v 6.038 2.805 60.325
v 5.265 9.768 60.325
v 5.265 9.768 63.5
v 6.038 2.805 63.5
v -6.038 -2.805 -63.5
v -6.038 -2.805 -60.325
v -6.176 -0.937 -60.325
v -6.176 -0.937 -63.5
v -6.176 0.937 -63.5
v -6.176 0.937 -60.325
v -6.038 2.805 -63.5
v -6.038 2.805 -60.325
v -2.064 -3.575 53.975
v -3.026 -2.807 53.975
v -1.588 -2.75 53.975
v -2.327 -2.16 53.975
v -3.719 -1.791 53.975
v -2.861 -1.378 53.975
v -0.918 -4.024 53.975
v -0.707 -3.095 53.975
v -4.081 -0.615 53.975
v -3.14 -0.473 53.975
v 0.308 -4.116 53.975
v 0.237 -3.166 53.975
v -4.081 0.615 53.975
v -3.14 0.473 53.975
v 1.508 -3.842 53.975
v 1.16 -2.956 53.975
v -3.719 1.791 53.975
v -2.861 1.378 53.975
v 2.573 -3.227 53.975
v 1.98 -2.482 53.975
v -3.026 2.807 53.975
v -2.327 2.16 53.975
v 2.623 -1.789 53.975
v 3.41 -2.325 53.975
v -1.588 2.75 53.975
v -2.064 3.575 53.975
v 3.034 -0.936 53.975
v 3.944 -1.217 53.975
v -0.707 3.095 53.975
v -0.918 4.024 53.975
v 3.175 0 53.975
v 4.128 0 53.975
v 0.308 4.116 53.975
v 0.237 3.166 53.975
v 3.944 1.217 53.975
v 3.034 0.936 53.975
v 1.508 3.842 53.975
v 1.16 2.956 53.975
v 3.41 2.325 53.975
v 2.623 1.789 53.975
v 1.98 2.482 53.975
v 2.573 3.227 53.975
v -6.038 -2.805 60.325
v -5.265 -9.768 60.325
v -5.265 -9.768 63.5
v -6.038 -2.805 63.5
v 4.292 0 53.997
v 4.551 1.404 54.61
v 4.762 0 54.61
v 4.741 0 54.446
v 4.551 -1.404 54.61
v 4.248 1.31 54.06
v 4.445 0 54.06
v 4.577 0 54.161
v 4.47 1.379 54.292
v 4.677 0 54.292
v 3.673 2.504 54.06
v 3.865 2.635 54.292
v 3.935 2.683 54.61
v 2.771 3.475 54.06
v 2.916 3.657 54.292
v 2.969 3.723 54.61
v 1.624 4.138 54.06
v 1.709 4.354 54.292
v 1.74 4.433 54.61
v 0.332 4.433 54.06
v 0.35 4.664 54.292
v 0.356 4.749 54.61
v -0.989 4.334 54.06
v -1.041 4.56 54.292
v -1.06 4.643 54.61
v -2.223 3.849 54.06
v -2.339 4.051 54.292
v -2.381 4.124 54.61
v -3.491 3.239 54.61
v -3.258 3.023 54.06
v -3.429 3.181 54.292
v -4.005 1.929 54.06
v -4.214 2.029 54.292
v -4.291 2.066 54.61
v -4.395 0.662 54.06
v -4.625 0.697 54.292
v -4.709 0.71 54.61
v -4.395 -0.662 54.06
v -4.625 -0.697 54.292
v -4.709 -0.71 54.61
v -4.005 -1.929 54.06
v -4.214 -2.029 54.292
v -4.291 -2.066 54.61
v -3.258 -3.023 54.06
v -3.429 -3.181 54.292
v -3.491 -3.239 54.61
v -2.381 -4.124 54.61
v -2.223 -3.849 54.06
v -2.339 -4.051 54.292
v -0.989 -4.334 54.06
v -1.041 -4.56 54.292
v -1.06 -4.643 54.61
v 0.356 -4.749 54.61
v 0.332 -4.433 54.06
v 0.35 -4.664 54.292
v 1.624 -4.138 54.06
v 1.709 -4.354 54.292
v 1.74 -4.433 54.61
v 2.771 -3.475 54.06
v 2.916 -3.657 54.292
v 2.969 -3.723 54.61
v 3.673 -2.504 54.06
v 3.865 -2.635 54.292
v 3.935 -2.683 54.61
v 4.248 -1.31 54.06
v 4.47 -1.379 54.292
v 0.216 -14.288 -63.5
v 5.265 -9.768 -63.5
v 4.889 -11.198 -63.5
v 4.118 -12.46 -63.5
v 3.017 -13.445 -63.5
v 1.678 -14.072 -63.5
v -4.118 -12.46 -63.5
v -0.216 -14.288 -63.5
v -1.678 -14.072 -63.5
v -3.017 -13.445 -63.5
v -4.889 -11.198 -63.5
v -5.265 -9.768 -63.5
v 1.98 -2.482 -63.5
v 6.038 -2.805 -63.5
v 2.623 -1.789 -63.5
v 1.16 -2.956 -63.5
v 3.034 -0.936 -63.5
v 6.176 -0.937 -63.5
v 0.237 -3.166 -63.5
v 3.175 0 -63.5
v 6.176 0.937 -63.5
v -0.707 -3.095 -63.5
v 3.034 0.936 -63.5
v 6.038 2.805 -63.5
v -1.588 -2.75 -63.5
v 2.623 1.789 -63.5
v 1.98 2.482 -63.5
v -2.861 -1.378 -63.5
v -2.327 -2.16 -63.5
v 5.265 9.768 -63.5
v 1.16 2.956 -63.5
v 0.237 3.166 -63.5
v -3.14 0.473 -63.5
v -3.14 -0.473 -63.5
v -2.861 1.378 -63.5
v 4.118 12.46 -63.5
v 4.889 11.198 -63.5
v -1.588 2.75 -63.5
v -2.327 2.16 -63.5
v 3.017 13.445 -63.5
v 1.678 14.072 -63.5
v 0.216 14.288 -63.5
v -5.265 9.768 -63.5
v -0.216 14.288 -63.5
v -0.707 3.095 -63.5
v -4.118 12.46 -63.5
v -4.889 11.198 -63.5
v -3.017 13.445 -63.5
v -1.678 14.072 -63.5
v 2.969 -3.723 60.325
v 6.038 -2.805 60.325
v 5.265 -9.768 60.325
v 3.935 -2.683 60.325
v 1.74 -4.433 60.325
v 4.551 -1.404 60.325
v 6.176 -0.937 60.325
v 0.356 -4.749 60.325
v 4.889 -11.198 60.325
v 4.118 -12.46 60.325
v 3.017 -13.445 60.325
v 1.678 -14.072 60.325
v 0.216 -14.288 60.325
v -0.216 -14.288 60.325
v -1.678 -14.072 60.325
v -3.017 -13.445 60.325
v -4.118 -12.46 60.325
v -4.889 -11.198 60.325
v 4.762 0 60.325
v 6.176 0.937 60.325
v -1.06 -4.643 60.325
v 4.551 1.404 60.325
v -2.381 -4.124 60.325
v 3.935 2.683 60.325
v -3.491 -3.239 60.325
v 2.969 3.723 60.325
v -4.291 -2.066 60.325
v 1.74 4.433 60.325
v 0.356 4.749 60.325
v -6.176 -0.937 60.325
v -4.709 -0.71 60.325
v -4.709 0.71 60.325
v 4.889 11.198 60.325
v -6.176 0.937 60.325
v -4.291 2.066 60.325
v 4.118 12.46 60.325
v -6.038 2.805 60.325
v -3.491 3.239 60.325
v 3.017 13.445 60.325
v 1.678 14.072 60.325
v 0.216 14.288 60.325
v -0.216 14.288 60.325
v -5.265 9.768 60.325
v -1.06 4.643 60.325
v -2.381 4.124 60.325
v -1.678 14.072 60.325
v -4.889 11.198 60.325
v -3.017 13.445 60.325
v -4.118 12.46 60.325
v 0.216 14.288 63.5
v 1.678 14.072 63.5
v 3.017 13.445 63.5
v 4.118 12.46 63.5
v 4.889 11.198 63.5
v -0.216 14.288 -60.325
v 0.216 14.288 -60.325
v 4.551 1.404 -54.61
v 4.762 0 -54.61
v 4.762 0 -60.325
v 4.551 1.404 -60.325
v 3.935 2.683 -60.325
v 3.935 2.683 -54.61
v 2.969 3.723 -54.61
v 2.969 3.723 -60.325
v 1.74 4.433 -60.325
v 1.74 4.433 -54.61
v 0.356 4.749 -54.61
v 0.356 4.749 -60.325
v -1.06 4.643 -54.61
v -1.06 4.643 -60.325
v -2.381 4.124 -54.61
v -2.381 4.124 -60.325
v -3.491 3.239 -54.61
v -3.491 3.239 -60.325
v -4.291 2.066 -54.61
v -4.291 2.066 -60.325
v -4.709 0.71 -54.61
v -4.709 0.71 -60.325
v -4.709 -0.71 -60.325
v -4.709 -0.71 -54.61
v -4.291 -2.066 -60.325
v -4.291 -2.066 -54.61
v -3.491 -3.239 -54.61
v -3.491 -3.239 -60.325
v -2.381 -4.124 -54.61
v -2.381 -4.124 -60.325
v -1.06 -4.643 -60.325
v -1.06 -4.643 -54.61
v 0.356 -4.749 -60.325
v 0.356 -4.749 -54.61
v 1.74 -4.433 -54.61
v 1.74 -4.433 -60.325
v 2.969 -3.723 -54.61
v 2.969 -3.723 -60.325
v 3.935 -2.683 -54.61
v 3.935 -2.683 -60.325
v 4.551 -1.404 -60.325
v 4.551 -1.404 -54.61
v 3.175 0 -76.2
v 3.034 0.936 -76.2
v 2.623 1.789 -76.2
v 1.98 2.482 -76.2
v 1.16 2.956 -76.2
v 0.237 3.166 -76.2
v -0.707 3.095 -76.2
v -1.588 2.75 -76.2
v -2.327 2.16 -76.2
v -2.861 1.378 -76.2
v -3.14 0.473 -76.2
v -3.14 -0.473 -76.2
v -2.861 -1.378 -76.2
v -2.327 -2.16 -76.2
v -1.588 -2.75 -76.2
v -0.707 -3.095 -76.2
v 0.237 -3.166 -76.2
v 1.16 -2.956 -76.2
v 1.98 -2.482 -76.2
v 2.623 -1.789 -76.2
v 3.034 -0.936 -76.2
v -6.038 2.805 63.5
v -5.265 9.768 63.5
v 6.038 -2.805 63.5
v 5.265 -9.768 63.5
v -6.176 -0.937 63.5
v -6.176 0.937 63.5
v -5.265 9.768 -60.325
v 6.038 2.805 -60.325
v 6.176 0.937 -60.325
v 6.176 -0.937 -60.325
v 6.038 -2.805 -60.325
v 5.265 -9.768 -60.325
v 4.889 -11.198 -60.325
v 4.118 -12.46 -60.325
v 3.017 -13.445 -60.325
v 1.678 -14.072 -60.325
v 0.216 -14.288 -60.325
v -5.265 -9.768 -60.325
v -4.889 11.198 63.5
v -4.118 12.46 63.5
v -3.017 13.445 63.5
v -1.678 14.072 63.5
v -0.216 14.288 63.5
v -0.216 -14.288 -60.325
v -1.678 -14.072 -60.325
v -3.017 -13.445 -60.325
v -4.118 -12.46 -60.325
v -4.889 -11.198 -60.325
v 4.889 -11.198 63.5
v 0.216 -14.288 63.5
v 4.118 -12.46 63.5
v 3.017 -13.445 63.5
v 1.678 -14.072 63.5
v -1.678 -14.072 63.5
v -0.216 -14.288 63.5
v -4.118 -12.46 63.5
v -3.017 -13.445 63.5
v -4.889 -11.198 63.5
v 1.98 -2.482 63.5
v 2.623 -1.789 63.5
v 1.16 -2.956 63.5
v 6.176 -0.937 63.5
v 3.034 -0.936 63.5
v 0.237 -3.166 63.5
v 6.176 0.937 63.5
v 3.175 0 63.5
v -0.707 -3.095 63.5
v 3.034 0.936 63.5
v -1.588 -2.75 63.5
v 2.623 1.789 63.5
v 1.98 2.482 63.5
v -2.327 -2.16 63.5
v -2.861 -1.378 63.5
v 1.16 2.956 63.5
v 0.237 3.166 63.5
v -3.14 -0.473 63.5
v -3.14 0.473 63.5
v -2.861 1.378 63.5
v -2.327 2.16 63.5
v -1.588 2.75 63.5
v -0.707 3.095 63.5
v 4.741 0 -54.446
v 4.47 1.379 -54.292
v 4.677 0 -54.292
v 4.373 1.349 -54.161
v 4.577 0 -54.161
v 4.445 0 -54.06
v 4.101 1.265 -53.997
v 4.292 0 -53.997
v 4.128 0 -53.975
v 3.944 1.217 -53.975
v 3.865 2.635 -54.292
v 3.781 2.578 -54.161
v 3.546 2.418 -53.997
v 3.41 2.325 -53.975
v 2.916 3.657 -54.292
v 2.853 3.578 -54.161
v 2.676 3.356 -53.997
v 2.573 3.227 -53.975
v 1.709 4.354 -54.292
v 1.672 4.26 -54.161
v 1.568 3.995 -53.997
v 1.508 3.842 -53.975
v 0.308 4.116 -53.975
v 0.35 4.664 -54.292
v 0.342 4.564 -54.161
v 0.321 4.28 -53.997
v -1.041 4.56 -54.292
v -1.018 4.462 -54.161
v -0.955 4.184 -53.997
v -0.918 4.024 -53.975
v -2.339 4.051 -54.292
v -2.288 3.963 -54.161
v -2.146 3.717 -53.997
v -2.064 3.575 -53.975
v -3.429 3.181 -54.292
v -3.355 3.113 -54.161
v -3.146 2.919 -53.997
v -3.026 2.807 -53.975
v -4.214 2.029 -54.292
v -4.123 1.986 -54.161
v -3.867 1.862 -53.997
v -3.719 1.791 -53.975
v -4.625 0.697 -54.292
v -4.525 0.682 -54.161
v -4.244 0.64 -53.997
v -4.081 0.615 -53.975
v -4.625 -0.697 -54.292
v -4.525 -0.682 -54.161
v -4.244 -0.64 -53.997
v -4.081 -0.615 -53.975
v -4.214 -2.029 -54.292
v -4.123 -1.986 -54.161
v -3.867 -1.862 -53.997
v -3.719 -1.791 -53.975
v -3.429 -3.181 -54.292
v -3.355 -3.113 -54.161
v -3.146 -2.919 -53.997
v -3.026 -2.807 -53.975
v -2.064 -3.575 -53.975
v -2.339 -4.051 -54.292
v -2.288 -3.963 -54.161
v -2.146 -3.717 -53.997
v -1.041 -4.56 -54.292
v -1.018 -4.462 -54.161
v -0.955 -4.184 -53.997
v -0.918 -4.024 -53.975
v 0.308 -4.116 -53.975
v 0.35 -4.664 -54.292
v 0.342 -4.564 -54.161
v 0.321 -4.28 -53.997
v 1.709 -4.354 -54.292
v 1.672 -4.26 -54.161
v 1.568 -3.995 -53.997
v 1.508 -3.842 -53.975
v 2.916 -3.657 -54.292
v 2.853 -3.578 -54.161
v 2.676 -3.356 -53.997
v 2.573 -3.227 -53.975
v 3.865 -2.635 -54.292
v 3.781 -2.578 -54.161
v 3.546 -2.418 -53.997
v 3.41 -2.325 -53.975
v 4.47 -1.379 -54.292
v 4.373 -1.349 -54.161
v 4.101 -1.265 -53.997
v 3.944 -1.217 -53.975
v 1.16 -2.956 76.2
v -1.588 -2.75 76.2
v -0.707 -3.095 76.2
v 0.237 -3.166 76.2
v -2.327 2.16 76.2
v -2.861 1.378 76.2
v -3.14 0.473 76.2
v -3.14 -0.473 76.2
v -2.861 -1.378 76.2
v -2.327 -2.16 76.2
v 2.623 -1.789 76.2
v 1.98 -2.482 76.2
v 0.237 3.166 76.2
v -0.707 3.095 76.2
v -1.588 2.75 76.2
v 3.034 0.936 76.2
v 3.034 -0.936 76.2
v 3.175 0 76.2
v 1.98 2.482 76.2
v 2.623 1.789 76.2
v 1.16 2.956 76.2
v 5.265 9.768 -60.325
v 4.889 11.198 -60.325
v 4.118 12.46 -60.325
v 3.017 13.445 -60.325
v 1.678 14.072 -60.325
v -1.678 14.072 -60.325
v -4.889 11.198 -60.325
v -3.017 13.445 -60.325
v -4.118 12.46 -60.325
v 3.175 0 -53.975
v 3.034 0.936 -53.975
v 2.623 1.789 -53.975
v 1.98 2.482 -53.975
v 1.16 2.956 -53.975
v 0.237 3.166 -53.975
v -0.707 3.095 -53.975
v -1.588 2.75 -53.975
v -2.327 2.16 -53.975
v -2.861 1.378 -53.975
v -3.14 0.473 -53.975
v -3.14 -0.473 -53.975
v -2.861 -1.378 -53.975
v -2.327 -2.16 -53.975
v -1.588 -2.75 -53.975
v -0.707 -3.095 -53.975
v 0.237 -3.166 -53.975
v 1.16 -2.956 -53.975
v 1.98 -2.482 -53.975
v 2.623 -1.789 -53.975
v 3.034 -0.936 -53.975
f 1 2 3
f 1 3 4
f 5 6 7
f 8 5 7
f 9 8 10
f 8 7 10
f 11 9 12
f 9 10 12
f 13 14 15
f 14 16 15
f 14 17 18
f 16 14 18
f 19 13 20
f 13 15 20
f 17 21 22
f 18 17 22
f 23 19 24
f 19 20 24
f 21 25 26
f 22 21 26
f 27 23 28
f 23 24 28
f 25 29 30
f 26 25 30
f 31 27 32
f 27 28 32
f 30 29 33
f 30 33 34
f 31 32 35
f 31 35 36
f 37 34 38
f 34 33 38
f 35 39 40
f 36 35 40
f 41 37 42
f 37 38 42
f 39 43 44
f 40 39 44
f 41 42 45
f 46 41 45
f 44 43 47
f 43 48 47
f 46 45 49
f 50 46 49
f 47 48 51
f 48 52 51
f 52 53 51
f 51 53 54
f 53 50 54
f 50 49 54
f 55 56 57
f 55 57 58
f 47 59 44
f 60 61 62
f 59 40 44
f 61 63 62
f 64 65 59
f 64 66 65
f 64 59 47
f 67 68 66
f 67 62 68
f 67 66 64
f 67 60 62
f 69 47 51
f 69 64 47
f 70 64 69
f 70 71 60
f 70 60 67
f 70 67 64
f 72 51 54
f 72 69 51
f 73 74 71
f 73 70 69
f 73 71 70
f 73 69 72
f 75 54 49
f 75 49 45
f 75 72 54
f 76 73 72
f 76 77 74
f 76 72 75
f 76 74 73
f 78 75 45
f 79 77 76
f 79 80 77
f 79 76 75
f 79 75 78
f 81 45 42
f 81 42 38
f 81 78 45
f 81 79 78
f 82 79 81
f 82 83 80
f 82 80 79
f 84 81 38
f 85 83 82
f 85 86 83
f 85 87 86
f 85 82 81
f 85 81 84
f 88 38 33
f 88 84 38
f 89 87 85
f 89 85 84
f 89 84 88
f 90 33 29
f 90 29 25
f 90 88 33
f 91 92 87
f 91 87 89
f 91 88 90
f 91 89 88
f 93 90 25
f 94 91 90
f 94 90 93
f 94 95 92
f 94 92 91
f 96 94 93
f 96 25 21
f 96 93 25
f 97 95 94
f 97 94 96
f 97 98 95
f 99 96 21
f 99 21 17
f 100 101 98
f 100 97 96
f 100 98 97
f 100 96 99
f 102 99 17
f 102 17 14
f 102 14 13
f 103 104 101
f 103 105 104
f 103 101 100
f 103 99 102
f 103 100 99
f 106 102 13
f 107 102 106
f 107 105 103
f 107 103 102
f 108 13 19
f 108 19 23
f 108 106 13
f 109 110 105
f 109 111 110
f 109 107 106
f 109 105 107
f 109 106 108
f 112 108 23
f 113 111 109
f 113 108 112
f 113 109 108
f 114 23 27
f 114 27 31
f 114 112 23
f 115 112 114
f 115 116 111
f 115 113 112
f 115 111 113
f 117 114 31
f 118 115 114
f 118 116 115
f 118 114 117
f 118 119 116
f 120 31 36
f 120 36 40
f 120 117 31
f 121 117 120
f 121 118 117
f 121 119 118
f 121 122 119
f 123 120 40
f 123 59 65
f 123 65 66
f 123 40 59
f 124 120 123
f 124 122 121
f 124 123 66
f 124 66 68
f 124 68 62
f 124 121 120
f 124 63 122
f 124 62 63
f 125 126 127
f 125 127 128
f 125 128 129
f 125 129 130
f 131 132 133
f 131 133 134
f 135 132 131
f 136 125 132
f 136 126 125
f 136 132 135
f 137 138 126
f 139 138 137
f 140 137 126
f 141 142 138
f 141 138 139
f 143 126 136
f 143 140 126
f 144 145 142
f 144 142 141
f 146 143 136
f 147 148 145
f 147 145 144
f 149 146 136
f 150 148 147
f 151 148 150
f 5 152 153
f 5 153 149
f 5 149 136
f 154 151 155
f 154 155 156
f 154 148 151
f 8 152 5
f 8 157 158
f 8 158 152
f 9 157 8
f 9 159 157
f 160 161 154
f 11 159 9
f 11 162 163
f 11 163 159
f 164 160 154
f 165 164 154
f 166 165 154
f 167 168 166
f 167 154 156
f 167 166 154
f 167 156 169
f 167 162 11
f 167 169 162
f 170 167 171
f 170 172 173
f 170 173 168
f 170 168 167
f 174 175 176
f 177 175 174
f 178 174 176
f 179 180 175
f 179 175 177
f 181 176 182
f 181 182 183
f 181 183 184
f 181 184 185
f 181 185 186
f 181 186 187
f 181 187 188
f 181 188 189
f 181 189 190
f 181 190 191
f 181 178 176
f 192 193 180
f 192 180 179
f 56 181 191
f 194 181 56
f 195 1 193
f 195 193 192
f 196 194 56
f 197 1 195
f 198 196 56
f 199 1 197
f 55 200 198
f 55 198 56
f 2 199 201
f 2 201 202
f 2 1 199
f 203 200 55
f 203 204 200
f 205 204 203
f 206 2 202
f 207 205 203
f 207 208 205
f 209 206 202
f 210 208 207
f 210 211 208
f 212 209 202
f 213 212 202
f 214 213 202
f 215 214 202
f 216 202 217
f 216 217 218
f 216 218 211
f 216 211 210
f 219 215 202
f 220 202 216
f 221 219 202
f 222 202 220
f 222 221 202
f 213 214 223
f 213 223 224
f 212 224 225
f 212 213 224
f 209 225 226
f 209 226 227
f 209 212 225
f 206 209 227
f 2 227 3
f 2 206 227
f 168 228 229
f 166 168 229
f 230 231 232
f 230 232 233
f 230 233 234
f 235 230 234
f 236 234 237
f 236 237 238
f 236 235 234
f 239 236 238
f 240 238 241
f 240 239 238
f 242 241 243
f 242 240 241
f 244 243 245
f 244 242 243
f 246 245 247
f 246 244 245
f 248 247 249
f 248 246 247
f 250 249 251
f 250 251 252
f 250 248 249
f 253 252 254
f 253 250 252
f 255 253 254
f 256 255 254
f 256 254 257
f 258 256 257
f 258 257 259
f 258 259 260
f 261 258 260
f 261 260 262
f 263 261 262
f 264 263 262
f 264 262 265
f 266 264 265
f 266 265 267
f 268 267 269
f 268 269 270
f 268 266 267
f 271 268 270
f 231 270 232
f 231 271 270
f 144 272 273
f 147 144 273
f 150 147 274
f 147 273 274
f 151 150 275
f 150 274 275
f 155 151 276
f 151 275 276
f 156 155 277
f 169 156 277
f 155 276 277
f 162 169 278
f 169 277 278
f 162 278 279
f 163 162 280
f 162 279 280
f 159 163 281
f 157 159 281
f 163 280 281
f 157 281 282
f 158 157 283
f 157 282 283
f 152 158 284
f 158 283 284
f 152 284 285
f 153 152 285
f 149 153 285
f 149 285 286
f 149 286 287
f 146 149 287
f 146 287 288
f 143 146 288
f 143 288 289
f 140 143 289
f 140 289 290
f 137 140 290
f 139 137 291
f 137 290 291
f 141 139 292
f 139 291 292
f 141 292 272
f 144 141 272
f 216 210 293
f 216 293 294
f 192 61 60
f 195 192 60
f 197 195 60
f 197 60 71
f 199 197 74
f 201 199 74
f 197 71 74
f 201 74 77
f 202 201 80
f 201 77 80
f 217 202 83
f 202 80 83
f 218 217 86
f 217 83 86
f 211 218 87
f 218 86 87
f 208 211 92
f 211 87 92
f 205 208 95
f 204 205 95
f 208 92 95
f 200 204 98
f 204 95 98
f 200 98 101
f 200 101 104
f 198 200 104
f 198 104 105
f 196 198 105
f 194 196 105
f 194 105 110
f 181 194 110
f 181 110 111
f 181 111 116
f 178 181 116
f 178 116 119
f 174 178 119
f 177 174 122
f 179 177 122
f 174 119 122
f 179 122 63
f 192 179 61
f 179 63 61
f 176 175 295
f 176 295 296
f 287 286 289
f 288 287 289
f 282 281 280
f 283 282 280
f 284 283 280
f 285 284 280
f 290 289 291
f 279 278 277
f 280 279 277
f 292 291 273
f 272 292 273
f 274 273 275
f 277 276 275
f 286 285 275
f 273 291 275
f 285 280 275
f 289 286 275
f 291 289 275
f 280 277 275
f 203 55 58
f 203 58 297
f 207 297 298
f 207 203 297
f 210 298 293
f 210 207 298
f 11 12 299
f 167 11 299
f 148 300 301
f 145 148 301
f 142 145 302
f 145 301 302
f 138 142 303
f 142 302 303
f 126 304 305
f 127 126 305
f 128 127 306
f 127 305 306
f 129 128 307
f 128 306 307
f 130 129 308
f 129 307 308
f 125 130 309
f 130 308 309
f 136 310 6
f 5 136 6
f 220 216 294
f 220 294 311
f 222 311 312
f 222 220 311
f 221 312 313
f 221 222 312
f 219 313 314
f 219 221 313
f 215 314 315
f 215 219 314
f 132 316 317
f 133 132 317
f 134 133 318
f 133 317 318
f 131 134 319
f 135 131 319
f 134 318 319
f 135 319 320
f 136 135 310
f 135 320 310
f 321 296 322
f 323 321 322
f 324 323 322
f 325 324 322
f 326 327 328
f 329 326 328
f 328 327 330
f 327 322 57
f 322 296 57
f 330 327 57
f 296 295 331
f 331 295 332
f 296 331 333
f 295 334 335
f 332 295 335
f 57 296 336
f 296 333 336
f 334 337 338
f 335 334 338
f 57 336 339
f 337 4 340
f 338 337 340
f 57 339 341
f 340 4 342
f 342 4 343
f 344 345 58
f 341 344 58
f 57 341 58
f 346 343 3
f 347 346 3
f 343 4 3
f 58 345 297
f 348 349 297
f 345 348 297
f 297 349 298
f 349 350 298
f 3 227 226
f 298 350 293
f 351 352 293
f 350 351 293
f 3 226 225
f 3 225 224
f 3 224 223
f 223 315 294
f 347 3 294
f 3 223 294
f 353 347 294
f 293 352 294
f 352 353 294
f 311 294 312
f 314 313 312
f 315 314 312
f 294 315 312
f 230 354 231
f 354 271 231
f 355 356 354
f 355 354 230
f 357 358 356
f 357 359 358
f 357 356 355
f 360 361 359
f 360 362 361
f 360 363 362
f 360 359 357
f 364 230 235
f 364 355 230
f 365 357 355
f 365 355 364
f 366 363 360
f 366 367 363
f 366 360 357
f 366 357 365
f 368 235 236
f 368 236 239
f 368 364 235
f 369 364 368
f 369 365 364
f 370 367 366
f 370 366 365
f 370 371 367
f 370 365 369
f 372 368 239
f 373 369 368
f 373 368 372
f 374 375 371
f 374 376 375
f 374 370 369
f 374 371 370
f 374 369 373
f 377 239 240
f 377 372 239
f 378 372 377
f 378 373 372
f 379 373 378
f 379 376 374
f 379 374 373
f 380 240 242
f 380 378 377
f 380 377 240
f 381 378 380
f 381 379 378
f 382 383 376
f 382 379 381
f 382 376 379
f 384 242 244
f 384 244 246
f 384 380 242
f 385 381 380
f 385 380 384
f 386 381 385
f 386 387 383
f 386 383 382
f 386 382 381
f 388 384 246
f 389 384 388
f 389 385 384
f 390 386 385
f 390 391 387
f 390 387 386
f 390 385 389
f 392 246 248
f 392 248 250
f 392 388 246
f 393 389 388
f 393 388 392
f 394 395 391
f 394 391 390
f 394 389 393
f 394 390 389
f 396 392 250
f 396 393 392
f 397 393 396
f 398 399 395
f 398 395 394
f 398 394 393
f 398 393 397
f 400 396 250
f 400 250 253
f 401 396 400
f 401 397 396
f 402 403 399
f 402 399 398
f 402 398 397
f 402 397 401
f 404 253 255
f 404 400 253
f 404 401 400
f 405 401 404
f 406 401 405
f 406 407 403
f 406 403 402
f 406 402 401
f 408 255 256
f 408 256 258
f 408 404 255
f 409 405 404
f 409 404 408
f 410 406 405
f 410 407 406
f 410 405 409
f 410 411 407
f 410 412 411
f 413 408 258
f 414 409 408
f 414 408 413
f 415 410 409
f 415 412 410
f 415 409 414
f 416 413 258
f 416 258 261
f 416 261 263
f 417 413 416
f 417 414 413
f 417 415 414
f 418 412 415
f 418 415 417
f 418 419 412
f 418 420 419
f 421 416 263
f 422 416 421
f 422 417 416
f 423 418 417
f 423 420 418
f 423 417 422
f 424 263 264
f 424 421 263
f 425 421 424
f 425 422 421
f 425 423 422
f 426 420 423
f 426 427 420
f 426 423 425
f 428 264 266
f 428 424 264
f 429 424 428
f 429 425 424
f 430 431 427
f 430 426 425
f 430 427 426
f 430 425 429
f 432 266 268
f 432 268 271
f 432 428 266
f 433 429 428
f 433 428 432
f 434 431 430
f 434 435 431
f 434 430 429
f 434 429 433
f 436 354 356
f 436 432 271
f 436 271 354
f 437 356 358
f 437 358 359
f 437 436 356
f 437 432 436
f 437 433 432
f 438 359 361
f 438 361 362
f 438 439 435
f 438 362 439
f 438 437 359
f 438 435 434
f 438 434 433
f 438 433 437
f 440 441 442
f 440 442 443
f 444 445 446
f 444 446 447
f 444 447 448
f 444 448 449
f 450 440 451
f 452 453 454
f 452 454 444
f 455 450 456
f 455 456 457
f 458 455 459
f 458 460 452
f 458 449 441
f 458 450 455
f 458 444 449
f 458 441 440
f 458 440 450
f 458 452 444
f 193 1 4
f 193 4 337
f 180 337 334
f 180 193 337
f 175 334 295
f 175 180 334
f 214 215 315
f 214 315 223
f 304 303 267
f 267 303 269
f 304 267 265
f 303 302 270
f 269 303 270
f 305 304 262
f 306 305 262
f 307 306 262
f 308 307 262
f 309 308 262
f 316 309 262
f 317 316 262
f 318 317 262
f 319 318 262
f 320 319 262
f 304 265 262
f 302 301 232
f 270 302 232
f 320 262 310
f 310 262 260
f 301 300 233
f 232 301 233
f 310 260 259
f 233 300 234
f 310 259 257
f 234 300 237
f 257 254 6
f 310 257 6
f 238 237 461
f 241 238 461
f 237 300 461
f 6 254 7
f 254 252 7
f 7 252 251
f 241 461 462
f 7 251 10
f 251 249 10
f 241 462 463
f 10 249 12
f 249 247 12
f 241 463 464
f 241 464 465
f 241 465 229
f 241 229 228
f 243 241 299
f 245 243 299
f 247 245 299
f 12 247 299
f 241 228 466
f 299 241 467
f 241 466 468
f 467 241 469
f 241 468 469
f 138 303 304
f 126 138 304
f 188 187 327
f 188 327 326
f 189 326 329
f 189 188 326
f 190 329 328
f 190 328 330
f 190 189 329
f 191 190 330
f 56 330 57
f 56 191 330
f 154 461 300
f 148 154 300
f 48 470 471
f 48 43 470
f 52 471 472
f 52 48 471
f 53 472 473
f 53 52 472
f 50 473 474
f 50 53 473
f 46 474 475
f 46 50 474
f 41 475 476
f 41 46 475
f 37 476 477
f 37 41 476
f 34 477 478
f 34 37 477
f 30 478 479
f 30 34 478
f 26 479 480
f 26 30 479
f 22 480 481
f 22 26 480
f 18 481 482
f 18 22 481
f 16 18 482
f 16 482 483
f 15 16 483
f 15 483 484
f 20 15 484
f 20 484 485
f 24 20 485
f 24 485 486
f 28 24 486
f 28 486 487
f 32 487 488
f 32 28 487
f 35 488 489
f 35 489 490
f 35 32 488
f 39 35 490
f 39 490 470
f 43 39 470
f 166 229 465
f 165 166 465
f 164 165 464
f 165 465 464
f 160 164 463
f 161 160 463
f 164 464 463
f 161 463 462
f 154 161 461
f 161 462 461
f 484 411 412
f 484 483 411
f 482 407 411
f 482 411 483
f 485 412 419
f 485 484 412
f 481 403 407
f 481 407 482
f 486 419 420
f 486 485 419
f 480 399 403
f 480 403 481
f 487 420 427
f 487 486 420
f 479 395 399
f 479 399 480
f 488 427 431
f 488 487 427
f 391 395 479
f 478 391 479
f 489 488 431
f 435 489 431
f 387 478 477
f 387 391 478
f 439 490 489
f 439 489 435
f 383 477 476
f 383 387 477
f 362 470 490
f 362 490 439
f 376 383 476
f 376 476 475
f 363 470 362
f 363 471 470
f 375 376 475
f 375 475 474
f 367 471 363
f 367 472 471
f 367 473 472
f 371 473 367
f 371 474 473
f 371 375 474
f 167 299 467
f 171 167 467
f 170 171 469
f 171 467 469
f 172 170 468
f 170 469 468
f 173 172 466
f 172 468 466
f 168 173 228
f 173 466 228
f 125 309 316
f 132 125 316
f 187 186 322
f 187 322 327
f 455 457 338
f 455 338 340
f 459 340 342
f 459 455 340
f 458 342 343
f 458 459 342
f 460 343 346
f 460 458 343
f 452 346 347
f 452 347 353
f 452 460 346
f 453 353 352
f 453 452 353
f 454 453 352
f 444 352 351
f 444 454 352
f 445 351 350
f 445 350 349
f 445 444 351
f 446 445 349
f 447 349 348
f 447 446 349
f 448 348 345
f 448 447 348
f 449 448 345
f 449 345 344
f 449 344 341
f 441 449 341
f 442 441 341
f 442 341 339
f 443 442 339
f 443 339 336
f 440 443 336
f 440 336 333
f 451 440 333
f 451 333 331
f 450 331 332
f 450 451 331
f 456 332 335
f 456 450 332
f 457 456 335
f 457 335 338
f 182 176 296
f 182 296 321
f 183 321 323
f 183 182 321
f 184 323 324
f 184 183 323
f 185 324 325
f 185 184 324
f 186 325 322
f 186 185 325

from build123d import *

# Parameters (mm, degrees)
SKETCH1_R           = 3.175
BOSS_EXTRUDE1_DEPTH = 53.975
SKETCH2_R           = 4.7625
BOSS_EXTRUDE2_DEPTH = 6.35
BOSS_EXTRUDE3_DEPTH = 3.175
FILLET1_R           = 0.635
BOSS_EXTRUDE4_START = 12.7
SKETCH4_R           = 3.175
BOSS_EXTRUDE4_DEPTH = 12.7


with BuildPart() as part:
    # Sketch1 → Boss-Extrude1 (new body)
    with BuildSketch(Plane.XY):
        Circle(SKETCH1_R)
    boss_extrude1 = extrude(amount=BOSS_EXTRUDE1_DEPTH)

    # Sketch2 → Boss-Extrude2 (add)
    with BuildSketch(Plane.XY.offset(53.975)):
        Circle(SKETCH2_R)
    boss_extrude2 = extrude(amount=BOSS_EXTRUDE2_DEPTH)

    # Sketch3 → Boss-Extrude3 (add)
    with BuildSketch(Plane.XY.offset(60.325)):
        with BuildLine():
            Line((-0.215682611, 14.2875), (0.215682611, 14.2875))
            ThreePointArc((0.215682611, 14.2875), (3.60364364, 12.992750331), (5.264611983, 9.768492152))
            Line((5.264611983, 9.768492152), (6.038337693, 2.804960762))
            ThreePointArc((6.038337693, 2.804960762), (6.193690832, 0), (6.038337693, -2.804960762))
            Line((6.038337693, -2.804960762), (5.264611983, -9.768492152))
            ThreePointArc((5.264611983, -9.768492152), (3.60364364, -12.992750331), (0.215682611, -14.2875))
            Line((0.215682611, -14.2875), (-0.215682611, -14.2875))
            ThreePointArc((-0.215682611, -14.2875), (-3.60364364, -12.992750331), (-5.264611983, -9.768492152))
            Line((-5.264611983, -9.768492152), (-6.038337693, -2.804960762))
            ThreePointArc((-6.038337693, -2.804960762), (-6.193690832, 0), (-6.038337693, 2.804960762))
            Line((-6.038337693, 2.804960762), (-5.264611983, 9.768492152))
            ThreePointArc((-5.264611983, 9.768492152), (-3.60364364, 12.992750331), (-0.215682611, 14.2875))
        make_face()
    boss_extrude3 = extrude(amount=BOSS_EXTRUDE3_DEPTH)

    # Mirror1: Boss-Extrude1, Boss-Extrude2, Boss-Extrude3 across plane
    add(boss_extrude1.mirror(Plane.XY))
    add(boss_extrude2.mirror(Plane.XY))
    add(boss_extrude3.mirror(Plane.XY))

    # Fillet1
    fillet1_edges = [part.edges().sort_by_distance(p)[0] for p in [
        (-4.7625, 0, -53.975),
        (-4.7625, 0, 53.975),
    ]]
    fillet(fillet1_edges, radius=FILLET1_R)

    # Sketch4 → Boss-Extrude4 (add)
    with BuildSketch(Plane.XY.offset(63.5).offset(BOSS_EXTRUDE4_START)):
        Circle(SKETCH4_R)
    boss_extrude4 = extrude(amount=-BOSS_EXTRUDE4_DEPTH)

    # Mirror2: Boss-Extrude4 across plane
    add(boss_extrude4.mirror(Plane.XY))


solid = part.part
